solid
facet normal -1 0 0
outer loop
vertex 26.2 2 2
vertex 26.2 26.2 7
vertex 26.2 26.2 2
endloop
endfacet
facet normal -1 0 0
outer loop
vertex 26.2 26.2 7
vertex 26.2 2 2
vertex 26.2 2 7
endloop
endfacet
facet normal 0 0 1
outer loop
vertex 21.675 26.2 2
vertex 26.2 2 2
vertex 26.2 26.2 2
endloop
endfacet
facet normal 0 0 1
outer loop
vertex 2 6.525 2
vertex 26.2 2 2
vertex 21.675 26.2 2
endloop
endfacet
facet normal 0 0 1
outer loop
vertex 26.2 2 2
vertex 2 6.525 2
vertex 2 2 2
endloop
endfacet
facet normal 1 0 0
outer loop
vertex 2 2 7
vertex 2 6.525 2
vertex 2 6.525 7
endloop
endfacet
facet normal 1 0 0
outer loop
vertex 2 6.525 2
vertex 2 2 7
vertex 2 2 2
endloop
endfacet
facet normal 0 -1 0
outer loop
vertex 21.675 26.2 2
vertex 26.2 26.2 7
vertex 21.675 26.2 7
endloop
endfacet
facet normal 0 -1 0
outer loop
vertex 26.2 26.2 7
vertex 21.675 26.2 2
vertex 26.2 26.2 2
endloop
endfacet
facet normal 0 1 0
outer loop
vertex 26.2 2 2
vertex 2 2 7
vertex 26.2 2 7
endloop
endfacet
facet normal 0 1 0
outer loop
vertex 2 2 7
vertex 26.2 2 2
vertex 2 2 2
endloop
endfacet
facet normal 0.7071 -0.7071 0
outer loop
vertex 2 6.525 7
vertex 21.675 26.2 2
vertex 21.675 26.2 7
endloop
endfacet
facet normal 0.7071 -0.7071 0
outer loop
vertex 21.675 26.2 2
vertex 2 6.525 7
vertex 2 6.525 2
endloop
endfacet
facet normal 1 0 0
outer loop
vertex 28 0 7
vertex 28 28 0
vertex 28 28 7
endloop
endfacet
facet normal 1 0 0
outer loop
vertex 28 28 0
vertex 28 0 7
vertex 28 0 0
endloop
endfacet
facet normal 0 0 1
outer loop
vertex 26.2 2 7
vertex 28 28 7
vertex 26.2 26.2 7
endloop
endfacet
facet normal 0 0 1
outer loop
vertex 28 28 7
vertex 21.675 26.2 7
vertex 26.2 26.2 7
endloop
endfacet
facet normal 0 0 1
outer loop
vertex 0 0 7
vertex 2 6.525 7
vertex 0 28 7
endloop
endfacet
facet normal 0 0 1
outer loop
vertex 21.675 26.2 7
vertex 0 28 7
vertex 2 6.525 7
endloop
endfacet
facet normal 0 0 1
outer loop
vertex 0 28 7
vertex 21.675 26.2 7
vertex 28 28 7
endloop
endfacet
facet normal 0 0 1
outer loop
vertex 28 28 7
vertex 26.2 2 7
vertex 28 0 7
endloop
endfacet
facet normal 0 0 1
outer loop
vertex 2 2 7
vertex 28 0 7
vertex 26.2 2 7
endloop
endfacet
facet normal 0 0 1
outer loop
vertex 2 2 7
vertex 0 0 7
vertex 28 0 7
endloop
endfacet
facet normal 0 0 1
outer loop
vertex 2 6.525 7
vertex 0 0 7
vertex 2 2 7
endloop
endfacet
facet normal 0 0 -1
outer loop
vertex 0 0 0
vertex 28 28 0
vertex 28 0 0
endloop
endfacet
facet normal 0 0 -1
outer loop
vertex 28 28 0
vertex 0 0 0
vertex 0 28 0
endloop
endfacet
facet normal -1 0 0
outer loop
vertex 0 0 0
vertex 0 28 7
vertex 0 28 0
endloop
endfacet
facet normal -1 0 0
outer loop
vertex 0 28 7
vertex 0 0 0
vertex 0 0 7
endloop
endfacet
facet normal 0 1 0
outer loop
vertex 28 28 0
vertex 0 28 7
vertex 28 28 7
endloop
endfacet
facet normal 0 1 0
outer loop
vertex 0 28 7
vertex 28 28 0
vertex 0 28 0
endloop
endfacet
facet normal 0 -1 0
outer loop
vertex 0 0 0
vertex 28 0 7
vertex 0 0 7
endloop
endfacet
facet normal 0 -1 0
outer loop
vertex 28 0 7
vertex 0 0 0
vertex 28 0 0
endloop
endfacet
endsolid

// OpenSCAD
// Microscope slide holder for RF-6000 Spectrofluorophotometer
// top cap

// Units are mm
// Parameters
base_height = 0; // top to bottom of the instrument, z
stage_base = 2; // z location of bottom of stage cut
post_width = 24; // square base
post_height = 7;

stage_d = 2;
shroud_thickness = 3;

tolerance = 0.2; // for gaps to allow slide to pass
hypotenuse = ((2*(post_width^2))^(0.5));

difference() {
    // Holder
    rotate([0,0,0])
    translate([0, 0, base_height])
    cube([post_width+(2*stage_d), post_width+(2*stage_d), post_height]);
    
    difference() {
        // Cutting out the stage
        rotate([0,0,0])
        translate([stage_d, stage_d, stage_base])
        cube([post_width+tolerance,post_width+tolerance, post_height]);
        
        // Remove the corner
        rotate([0, 0, 45])
        translate([0, (shroud_thickness+tolerance), -1])
        cube([2*hypotenuse, 2*hypotenuse, 2+stage_base+post_height]);
    }
}
